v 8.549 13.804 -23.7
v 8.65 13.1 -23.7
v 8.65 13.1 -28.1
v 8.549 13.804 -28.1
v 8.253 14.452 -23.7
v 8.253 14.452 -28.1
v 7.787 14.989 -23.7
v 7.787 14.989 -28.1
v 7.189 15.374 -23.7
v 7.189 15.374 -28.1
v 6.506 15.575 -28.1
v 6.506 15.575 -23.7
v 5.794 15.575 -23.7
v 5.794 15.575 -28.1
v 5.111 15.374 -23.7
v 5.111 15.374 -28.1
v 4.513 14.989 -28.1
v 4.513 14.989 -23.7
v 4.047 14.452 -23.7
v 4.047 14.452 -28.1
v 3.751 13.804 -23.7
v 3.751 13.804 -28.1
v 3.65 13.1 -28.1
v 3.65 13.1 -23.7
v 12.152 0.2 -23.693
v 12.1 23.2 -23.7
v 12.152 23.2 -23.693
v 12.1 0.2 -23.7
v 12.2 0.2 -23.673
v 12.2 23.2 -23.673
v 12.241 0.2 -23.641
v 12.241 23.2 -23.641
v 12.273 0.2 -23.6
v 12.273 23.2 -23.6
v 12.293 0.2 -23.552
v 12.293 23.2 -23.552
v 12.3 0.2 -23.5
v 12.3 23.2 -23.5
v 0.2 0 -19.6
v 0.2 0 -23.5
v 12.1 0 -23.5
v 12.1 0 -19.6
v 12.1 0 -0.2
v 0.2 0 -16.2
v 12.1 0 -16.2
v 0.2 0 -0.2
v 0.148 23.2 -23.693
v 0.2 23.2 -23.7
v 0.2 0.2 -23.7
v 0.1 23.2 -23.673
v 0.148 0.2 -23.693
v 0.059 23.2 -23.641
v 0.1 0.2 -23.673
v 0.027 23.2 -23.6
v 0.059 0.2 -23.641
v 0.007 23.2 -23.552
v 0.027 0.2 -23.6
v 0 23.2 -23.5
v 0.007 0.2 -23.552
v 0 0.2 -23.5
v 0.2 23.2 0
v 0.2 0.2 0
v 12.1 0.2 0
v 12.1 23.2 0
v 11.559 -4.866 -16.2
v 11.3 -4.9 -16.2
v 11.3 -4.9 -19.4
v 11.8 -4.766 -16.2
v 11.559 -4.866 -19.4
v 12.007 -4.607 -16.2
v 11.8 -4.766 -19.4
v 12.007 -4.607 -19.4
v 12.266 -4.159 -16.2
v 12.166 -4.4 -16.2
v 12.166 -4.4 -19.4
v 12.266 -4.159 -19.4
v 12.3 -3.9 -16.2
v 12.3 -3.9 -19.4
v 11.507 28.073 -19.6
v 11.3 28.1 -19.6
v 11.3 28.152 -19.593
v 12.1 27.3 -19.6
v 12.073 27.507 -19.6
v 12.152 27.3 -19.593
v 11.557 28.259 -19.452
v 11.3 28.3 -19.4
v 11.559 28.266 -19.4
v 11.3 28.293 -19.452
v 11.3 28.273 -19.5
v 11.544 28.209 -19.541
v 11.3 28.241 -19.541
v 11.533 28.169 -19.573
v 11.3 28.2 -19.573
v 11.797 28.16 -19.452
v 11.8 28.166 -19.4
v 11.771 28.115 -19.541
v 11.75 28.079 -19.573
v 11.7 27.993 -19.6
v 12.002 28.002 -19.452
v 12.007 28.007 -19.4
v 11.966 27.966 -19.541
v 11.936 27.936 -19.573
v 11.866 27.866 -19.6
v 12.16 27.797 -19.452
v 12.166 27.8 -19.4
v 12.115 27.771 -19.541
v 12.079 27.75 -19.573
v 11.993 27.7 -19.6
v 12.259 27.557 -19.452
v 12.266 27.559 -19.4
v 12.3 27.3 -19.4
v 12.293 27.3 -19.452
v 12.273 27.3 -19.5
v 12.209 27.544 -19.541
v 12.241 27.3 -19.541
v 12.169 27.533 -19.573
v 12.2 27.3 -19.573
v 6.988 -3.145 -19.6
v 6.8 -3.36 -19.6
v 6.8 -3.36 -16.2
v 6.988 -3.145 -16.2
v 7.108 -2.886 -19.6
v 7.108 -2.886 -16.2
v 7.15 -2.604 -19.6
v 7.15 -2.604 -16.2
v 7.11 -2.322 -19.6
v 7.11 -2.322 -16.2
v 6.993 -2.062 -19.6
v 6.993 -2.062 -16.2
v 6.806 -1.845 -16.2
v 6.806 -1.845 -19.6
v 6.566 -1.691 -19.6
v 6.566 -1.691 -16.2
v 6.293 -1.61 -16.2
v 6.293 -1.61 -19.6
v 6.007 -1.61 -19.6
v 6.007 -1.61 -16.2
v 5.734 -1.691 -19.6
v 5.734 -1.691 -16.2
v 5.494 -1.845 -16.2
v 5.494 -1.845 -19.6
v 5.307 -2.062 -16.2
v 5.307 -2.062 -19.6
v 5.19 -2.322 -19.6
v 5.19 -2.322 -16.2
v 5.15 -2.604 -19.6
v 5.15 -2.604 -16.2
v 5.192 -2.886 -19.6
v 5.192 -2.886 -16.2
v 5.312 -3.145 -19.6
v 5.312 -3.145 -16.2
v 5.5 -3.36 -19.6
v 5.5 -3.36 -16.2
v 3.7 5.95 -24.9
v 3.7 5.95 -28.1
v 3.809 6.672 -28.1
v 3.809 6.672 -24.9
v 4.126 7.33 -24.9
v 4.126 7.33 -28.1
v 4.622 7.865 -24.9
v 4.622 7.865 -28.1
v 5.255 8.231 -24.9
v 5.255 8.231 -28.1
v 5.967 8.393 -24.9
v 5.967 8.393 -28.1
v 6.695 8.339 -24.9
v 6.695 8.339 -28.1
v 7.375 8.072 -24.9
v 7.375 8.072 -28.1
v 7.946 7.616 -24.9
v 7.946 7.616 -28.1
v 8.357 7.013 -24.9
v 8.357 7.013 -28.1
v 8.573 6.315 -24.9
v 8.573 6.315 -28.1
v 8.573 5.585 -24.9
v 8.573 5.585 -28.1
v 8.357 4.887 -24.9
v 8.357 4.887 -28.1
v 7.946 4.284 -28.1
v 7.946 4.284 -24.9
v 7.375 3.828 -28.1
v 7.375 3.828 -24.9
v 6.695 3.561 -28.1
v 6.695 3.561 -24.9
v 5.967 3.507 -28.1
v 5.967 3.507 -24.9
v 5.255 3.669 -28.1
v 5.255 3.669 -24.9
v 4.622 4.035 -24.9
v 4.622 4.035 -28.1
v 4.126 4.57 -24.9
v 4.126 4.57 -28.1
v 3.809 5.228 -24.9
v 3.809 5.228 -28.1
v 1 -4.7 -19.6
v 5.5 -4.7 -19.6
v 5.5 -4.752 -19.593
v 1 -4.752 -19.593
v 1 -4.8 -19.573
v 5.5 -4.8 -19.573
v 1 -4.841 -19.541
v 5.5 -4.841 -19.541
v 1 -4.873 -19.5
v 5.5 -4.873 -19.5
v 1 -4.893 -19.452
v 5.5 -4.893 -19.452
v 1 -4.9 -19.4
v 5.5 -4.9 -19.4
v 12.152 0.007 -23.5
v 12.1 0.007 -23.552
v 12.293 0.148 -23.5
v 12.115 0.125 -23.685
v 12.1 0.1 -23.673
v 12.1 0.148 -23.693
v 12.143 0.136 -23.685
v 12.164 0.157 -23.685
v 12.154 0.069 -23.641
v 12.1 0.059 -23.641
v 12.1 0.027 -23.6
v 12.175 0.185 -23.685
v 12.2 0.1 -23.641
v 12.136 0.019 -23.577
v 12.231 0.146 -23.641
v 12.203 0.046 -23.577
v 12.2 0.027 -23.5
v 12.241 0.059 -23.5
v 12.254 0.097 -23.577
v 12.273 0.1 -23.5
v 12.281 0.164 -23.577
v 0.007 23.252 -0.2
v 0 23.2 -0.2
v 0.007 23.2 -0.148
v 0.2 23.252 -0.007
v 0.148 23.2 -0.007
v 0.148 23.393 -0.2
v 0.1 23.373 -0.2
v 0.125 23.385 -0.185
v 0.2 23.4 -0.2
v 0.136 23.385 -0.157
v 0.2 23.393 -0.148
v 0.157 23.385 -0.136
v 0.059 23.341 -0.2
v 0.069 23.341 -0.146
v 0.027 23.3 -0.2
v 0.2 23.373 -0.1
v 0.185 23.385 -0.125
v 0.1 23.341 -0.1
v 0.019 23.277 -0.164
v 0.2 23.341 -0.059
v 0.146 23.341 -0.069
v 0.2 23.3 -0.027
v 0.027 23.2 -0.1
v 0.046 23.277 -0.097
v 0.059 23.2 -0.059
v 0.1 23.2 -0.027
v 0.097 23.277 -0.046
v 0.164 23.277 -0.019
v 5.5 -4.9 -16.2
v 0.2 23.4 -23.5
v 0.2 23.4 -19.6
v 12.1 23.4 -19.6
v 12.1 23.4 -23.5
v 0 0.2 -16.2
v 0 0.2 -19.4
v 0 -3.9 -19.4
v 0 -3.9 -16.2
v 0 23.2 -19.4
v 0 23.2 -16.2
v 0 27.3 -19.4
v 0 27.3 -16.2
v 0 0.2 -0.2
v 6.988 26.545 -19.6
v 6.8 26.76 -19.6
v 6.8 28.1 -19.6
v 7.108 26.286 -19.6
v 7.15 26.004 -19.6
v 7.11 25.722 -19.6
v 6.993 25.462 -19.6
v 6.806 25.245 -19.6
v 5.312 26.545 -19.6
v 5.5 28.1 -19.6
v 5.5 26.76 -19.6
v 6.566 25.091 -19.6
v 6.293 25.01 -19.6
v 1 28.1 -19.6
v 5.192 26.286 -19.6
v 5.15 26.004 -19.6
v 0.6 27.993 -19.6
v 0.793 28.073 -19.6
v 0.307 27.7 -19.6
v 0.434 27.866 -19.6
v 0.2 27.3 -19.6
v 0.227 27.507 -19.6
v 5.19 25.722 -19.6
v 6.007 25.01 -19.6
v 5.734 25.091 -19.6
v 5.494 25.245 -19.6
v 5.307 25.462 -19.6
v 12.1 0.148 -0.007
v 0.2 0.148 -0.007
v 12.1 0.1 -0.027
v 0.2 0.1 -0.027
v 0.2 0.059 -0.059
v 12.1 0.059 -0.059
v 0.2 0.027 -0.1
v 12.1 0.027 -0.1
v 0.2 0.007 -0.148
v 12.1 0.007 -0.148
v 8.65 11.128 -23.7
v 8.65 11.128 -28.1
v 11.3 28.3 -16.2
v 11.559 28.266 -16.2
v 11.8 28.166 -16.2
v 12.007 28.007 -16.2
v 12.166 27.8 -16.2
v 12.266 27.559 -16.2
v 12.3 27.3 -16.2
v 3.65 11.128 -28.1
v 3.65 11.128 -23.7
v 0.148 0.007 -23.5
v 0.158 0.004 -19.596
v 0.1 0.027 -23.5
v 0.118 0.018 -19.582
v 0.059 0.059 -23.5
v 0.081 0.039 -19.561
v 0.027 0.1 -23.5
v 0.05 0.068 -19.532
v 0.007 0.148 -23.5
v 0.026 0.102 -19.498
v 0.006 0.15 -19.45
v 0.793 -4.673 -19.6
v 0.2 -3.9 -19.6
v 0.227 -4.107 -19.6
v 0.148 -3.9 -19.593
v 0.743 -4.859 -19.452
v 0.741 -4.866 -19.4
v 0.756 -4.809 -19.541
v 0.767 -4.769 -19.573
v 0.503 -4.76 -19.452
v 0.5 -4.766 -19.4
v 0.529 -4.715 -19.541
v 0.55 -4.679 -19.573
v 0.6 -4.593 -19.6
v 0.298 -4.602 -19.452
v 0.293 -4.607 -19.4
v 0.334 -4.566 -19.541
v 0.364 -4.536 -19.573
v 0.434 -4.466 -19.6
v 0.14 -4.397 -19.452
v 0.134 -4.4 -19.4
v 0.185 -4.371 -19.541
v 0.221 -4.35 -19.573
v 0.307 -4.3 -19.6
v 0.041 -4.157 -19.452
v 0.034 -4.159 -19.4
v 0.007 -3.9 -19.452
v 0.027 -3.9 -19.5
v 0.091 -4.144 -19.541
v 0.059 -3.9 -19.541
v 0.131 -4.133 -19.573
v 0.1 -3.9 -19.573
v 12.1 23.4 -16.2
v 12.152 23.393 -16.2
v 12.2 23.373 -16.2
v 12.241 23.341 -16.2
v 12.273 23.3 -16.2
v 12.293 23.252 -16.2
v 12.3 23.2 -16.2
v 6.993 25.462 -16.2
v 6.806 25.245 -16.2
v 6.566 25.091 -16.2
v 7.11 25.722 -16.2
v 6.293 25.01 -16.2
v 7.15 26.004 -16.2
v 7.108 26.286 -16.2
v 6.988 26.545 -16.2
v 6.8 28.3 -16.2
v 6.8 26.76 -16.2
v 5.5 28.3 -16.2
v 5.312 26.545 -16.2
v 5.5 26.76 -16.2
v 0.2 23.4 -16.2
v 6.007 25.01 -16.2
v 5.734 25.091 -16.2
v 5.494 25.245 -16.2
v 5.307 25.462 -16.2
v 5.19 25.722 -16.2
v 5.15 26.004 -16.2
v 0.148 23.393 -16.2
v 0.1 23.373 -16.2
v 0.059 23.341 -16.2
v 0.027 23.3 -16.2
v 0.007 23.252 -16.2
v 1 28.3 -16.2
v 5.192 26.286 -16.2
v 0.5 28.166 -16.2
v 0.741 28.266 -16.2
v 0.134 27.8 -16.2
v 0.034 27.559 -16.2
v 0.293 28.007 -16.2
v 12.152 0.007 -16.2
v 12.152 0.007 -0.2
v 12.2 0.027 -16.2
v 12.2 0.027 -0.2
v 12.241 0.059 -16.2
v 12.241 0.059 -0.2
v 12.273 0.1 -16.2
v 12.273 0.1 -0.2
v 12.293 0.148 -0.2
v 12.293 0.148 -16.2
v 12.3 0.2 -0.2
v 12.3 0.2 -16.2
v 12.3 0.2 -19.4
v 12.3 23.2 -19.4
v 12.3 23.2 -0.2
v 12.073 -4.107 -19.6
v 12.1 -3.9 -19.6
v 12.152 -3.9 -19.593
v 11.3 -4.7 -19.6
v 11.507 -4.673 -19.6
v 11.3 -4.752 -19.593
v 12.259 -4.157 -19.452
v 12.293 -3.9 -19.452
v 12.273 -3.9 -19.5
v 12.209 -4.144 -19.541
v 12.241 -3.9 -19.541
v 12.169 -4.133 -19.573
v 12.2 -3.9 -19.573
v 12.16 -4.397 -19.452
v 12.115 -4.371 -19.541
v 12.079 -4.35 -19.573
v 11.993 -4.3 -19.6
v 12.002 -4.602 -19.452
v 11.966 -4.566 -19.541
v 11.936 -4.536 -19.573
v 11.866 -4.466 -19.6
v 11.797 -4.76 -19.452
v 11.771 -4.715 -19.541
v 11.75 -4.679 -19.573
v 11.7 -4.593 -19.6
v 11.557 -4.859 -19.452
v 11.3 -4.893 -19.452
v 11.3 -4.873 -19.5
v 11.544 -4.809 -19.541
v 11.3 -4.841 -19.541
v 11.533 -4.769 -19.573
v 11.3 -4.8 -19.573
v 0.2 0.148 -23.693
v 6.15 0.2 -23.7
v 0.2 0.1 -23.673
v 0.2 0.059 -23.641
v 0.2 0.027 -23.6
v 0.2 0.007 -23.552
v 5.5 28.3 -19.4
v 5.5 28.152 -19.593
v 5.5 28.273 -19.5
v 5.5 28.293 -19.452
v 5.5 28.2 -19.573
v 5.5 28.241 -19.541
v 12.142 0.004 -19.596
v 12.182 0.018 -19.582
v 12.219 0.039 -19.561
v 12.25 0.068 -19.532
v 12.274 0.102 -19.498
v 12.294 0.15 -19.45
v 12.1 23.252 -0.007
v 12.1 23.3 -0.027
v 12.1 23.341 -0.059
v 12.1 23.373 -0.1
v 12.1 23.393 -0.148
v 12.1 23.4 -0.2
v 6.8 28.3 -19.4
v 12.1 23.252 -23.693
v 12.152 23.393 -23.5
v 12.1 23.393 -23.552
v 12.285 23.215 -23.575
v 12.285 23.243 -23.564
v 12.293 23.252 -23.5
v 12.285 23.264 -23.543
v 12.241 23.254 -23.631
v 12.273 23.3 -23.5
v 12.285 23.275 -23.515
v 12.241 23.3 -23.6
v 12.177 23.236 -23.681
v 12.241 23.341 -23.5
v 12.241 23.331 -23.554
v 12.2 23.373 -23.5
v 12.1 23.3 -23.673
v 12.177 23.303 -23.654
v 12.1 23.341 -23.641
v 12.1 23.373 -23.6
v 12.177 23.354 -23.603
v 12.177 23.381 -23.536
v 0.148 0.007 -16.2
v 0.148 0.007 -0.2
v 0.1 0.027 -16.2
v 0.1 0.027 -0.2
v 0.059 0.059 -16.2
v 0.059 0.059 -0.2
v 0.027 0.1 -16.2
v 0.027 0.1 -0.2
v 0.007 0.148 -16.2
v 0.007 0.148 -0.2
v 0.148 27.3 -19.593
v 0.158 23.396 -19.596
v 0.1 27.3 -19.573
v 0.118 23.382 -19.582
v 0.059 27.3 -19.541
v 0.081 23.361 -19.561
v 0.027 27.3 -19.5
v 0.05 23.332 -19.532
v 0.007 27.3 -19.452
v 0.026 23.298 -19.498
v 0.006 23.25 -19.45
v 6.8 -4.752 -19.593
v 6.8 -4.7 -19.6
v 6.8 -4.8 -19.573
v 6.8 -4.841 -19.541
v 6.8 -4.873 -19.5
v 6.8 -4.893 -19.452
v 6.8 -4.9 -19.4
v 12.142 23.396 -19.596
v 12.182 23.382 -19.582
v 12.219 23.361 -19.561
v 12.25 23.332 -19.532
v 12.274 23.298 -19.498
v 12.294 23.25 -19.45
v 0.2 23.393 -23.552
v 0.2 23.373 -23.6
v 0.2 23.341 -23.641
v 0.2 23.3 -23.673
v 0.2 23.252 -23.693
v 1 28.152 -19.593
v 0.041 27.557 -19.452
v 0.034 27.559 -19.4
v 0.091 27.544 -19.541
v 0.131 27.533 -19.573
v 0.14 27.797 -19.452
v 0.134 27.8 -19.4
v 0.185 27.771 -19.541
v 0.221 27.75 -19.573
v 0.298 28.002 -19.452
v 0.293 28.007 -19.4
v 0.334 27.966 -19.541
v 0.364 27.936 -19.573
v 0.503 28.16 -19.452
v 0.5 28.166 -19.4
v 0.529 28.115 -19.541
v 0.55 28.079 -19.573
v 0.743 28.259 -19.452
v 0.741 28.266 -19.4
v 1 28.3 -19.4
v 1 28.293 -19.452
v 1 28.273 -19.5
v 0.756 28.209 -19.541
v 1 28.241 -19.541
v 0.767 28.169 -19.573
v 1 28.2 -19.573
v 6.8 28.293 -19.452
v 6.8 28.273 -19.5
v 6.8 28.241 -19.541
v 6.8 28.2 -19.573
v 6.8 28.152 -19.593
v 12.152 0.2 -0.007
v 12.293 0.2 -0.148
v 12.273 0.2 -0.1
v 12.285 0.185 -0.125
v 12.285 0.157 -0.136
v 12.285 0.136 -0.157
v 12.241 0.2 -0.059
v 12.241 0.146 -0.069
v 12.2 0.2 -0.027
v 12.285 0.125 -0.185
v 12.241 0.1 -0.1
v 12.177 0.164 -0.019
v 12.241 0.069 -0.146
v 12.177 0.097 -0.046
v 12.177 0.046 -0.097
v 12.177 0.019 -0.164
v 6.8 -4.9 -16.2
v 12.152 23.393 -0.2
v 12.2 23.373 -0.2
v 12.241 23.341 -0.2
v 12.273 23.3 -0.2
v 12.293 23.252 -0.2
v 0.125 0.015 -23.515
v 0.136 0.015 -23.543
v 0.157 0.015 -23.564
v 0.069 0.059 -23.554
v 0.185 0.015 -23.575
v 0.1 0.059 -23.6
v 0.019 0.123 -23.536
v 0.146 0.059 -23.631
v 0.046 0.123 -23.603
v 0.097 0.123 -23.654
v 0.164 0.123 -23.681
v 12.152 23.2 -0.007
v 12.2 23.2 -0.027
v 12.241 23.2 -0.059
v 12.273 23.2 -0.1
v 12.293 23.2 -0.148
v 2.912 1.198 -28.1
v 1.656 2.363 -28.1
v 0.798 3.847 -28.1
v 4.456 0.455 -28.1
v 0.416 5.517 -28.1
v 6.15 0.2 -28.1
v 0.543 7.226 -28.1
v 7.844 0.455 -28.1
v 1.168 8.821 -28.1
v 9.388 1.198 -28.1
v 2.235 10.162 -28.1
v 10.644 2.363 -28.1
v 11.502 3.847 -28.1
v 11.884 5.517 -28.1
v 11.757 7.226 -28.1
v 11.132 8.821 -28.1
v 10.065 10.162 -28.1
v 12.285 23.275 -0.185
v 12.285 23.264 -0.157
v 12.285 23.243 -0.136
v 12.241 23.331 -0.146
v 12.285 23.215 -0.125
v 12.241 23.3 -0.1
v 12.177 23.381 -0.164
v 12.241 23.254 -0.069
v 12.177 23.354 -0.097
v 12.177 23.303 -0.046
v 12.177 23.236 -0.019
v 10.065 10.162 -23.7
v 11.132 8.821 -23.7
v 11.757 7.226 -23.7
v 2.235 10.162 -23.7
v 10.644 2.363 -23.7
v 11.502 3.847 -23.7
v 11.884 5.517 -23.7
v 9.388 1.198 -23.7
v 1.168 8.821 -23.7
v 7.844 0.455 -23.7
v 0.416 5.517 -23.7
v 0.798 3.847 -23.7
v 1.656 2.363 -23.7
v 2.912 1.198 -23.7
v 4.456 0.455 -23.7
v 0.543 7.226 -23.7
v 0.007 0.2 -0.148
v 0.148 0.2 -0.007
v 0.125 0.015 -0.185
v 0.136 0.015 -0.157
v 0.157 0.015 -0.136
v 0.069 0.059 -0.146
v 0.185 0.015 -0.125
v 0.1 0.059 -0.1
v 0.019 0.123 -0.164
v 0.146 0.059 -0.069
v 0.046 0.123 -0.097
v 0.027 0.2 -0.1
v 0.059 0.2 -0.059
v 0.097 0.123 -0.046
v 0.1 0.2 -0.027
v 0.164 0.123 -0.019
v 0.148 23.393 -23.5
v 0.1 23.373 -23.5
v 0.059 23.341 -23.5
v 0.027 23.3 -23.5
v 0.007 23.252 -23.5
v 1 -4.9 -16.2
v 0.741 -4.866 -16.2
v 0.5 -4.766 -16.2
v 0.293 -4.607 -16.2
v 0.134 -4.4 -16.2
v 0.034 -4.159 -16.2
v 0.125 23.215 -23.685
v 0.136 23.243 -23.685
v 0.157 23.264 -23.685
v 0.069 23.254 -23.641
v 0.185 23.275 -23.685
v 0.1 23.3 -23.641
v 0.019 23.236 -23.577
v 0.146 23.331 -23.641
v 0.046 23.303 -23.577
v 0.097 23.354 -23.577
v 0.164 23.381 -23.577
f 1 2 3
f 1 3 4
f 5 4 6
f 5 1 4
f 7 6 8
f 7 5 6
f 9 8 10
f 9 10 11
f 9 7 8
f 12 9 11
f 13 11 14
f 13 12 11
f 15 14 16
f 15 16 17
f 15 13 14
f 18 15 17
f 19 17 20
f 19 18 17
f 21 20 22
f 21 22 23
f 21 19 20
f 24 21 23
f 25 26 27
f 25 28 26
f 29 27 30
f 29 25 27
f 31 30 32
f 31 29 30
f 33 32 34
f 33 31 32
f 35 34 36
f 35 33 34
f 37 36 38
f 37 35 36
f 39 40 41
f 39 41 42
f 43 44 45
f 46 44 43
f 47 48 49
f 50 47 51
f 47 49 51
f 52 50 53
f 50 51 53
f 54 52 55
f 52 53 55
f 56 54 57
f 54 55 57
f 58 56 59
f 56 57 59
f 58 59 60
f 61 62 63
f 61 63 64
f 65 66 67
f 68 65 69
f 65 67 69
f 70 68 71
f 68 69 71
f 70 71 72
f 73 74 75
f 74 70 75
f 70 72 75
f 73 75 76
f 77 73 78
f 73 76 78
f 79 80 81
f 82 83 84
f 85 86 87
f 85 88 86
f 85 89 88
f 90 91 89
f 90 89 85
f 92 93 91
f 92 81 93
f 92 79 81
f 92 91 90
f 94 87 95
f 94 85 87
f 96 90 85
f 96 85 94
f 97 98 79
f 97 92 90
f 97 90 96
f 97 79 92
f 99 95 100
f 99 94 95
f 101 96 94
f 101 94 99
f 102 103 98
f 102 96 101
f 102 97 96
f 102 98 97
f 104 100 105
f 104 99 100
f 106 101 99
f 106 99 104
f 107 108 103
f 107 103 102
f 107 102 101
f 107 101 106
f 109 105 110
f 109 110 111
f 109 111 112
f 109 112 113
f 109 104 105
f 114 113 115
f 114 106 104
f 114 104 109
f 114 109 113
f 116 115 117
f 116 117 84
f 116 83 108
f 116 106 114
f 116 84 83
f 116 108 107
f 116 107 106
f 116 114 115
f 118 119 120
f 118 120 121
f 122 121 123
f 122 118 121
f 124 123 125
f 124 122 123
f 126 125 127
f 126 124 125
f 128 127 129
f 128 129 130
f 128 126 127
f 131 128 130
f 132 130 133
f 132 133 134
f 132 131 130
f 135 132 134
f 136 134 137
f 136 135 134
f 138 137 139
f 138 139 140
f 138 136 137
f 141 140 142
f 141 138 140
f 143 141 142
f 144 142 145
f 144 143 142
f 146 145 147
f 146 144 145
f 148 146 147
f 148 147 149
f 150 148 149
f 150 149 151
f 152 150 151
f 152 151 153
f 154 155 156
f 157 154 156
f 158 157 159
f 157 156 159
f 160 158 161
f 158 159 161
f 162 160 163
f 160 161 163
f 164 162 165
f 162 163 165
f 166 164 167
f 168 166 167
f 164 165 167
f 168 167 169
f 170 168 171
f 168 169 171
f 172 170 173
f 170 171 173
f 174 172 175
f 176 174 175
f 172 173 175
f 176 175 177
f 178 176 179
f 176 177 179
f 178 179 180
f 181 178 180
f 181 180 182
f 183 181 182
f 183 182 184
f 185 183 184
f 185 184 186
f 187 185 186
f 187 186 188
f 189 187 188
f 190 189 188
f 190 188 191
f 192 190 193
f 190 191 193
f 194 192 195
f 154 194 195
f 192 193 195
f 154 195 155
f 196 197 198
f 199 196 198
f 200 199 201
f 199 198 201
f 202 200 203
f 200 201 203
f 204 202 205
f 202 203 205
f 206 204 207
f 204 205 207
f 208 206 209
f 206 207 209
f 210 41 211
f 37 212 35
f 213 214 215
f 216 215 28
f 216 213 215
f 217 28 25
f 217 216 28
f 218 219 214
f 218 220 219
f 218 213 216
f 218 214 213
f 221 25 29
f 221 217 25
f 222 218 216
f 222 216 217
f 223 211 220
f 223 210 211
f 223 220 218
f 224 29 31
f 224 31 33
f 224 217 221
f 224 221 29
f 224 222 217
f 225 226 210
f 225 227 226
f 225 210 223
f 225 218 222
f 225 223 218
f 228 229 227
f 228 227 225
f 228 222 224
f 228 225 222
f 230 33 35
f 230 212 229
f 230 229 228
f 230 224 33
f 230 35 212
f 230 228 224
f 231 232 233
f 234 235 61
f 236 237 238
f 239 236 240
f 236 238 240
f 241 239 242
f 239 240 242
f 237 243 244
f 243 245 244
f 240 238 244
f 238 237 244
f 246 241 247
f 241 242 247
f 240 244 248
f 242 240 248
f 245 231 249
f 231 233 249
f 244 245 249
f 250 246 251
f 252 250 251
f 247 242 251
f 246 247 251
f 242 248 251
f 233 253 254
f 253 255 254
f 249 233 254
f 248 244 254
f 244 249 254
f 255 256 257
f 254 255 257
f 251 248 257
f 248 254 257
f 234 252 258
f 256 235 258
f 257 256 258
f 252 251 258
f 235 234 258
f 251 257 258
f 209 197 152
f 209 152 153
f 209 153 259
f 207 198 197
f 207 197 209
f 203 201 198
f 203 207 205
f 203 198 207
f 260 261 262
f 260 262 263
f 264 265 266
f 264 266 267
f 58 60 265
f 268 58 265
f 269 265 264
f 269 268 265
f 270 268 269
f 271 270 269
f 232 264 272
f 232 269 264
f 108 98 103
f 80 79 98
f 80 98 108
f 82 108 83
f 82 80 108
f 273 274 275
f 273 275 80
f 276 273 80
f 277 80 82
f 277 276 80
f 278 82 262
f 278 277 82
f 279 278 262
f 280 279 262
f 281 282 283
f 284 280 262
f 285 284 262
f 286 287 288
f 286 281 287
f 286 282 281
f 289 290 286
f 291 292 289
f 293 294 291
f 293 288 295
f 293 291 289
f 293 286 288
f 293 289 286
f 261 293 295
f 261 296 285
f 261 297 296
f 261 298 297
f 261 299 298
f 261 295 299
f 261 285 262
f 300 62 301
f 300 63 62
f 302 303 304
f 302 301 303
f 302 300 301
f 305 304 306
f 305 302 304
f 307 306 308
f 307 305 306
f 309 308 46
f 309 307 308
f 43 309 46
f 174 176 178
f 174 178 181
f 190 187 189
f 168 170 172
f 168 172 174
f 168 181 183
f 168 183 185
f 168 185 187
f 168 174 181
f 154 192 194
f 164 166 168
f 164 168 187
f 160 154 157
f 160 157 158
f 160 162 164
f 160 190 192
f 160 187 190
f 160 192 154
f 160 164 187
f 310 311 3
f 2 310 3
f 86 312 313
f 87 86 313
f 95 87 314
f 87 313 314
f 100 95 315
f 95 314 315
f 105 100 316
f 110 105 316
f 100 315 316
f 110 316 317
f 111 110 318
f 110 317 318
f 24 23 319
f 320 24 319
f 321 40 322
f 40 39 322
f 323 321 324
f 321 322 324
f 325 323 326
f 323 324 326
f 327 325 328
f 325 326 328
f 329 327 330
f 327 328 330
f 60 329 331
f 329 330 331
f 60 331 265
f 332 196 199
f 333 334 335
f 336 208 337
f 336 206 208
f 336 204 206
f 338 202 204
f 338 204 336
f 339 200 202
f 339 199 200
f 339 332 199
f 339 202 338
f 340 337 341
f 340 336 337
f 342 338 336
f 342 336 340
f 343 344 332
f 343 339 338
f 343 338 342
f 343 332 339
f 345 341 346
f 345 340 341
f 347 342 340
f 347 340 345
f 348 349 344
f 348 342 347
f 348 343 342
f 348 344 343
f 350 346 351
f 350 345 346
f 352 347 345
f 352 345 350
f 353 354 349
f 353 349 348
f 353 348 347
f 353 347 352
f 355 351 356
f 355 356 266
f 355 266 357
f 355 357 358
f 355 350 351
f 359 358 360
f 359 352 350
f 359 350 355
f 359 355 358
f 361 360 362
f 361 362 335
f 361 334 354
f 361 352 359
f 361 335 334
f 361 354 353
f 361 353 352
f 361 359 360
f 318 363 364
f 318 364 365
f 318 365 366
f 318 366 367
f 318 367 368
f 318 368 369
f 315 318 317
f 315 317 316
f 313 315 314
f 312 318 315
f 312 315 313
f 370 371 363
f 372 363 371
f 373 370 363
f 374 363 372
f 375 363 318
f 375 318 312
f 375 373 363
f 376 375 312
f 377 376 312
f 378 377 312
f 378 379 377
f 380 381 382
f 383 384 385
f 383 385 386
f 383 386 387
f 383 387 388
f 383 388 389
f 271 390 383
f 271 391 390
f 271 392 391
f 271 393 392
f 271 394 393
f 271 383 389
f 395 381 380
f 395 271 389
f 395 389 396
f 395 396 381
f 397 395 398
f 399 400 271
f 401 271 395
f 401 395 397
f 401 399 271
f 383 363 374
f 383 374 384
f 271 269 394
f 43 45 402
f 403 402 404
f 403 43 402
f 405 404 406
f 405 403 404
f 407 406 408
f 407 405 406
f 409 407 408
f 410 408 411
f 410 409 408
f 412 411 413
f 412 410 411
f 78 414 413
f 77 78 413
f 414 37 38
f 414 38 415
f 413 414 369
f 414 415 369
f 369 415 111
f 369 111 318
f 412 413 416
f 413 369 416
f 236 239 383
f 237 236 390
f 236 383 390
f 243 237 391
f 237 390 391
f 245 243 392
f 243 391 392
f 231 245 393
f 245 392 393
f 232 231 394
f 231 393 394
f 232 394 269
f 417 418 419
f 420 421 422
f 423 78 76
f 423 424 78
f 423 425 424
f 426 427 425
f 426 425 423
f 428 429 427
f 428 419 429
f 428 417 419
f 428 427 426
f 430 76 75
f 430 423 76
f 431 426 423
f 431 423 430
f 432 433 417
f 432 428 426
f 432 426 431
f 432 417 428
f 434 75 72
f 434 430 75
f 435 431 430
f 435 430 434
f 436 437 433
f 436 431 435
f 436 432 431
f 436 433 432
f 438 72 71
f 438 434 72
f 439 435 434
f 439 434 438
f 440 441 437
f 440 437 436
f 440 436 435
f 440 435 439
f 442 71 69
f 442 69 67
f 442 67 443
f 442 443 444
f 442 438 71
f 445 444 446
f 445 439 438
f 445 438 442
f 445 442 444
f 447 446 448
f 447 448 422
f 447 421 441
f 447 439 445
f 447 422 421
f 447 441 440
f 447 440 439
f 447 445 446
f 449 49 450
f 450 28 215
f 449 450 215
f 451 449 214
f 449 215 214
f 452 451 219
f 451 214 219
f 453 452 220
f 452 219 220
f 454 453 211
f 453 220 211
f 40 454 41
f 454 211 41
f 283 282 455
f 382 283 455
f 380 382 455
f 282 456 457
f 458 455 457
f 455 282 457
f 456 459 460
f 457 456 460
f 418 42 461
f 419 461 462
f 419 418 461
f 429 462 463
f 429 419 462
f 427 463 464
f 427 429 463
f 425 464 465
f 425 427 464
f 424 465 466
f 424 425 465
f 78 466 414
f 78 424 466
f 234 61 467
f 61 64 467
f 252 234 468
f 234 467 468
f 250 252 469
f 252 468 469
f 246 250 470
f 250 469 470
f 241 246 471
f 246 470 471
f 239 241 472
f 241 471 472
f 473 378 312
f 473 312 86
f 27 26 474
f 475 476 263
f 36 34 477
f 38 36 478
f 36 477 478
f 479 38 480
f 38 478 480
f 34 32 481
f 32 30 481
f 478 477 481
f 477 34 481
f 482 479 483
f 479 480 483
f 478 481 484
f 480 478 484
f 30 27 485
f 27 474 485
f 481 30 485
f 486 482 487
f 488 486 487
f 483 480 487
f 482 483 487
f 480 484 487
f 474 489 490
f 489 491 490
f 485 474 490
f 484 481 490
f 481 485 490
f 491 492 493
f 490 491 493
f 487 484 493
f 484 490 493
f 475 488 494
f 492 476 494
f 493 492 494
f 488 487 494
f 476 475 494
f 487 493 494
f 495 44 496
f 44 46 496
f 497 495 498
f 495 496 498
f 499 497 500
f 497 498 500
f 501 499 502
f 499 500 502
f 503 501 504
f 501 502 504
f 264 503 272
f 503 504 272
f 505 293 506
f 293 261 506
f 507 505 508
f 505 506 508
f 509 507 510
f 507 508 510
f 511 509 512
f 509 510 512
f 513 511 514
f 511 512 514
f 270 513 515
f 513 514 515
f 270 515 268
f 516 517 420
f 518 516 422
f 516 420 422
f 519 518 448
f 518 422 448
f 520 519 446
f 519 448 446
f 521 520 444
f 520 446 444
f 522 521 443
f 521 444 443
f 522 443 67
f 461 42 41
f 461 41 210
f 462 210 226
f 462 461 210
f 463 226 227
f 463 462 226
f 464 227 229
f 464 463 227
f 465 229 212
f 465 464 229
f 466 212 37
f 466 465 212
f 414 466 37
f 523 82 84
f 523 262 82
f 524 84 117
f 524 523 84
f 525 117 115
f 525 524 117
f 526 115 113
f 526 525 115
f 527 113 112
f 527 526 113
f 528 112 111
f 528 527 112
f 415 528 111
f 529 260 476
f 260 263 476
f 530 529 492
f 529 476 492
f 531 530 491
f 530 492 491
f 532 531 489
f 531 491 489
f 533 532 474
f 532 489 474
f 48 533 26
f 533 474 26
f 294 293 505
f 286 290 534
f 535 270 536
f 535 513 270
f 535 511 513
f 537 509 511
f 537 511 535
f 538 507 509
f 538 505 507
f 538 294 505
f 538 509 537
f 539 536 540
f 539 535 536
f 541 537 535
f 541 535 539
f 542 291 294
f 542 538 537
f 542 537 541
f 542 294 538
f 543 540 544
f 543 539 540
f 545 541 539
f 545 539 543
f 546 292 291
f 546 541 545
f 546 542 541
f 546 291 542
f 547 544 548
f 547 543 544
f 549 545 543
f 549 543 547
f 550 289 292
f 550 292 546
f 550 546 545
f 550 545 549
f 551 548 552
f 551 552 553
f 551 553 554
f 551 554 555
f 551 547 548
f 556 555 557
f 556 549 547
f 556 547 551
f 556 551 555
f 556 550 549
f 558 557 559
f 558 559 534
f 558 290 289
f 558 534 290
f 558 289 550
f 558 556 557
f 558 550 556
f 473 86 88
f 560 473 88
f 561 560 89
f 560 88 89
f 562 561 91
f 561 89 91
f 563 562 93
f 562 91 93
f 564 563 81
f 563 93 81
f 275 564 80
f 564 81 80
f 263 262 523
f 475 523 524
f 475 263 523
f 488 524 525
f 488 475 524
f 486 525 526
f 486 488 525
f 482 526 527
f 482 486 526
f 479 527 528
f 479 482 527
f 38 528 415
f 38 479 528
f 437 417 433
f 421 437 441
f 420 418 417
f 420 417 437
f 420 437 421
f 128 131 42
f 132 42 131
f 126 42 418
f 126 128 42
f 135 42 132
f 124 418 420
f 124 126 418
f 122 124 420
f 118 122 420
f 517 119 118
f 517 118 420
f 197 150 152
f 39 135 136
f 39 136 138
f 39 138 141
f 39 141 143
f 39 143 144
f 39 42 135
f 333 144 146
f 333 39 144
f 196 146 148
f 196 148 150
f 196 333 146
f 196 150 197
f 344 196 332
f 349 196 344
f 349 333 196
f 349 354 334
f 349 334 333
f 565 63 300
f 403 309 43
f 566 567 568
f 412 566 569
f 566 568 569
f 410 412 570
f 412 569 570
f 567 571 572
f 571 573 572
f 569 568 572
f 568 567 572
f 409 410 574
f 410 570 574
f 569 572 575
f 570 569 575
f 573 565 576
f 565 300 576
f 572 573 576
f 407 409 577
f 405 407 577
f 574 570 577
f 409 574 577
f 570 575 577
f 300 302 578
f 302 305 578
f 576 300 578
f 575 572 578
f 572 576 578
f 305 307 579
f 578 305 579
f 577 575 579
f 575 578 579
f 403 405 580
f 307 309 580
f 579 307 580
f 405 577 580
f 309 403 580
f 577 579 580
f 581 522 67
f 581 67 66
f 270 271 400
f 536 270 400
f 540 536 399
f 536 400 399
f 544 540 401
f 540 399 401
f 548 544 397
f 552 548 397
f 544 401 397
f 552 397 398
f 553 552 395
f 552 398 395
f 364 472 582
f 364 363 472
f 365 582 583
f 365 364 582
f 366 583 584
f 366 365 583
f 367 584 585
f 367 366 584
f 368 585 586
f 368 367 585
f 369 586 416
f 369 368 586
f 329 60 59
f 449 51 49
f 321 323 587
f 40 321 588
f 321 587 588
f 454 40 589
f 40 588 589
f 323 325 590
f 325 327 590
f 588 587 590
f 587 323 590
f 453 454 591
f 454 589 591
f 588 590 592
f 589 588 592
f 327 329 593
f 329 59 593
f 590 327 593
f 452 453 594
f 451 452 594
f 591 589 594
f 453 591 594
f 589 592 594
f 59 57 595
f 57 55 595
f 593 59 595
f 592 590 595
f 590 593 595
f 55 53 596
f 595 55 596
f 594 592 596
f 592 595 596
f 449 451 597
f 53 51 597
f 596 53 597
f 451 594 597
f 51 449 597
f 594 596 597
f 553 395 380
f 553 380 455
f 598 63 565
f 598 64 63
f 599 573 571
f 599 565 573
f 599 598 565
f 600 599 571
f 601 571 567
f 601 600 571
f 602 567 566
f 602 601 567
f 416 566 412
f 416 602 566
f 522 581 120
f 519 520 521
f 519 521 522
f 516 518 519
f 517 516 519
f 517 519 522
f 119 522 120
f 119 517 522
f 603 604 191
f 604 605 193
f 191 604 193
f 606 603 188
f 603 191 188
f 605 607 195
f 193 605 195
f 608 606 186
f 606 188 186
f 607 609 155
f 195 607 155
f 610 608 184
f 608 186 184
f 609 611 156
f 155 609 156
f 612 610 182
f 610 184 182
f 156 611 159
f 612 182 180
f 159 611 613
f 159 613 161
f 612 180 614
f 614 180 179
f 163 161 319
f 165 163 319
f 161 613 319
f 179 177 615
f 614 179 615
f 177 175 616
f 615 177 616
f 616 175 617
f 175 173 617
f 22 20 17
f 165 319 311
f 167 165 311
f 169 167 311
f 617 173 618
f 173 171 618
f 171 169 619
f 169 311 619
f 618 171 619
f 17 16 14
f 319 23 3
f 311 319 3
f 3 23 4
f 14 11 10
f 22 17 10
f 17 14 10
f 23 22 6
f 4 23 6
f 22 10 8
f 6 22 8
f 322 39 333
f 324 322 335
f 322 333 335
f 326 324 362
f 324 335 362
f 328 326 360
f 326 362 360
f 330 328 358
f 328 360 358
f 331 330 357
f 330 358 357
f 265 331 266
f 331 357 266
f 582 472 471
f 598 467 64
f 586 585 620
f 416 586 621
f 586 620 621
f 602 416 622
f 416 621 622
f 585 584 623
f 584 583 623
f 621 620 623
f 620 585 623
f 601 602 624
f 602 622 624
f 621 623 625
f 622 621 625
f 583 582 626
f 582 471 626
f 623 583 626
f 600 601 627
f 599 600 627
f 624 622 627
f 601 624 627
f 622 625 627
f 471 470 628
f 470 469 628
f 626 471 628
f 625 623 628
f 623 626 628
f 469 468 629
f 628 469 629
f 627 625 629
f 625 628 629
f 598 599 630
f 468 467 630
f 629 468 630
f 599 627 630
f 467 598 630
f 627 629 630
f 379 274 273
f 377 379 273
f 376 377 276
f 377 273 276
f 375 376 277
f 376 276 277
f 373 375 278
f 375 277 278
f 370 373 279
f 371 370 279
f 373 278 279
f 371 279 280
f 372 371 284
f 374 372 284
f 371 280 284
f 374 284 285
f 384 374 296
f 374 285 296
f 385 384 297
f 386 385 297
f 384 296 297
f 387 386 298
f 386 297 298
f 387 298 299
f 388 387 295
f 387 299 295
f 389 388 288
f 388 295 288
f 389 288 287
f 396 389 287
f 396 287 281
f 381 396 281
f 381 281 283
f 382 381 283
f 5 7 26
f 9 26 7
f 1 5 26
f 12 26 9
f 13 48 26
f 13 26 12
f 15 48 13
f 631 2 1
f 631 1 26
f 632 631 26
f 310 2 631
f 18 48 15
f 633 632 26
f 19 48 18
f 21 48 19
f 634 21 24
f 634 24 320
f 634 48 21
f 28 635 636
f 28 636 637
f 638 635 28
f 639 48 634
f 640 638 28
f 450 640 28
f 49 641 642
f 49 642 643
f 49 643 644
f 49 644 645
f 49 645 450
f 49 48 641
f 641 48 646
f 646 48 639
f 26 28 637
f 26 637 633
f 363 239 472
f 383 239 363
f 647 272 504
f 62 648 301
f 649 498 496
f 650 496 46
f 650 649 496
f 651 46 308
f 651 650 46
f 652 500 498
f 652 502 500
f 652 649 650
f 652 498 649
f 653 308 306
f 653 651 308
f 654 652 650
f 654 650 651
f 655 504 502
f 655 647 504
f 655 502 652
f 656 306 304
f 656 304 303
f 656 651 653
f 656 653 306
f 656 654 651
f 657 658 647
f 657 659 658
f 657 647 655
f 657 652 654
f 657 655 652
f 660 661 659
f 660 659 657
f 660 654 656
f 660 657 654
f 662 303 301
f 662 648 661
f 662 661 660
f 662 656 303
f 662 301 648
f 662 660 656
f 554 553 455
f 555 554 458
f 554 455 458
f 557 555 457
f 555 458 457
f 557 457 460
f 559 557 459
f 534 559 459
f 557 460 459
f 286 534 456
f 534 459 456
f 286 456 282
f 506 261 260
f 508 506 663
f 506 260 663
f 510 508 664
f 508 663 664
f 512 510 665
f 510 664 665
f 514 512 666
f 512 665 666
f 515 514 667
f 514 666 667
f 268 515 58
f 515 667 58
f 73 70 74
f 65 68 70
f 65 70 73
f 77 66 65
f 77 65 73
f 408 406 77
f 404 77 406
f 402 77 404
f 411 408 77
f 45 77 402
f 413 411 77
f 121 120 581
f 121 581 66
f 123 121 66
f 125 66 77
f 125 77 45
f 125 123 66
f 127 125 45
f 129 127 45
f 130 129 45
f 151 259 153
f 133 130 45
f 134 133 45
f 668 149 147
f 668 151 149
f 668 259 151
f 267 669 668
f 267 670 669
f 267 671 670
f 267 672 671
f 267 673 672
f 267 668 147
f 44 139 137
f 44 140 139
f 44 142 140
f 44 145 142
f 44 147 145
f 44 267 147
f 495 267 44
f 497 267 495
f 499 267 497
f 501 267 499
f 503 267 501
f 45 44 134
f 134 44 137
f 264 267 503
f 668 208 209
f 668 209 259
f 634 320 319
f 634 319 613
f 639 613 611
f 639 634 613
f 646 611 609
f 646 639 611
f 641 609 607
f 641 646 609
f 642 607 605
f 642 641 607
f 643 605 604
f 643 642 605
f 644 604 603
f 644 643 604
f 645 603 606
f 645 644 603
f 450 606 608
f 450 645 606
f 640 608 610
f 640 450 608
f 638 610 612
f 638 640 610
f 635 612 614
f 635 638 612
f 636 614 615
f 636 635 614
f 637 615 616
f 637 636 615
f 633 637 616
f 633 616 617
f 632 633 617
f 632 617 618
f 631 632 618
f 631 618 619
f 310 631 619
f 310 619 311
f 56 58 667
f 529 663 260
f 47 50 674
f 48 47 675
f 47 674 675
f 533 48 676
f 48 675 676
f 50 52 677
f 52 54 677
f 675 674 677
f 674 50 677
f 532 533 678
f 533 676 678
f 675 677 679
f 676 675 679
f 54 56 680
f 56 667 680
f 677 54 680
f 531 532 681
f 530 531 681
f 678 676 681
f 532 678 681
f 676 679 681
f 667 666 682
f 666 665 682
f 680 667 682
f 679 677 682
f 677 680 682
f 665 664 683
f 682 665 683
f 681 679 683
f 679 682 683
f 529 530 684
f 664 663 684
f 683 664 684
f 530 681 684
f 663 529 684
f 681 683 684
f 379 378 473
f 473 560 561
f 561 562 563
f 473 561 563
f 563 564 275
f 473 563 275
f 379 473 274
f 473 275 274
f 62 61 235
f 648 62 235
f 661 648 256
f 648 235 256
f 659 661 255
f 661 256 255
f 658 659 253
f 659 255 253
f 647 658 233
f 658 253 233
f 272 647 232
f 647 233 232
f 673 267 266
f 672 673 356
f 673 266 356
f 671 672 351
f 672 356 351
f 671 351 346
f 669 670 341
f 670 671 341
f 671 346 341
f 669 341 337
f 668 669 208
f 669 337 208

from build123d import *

# Parameters (mm, degrees)
DODANIE_WYCI_GNI_CIE1_DEPTH = 12.3
ZAOKR_GLENIE1_R             = 0.2
ZAOKR_GLENIE2_R             = 1
DODANIE_WYCI_GNI_CIE2_DEPTH = 4.4
SZKIC3_R                    = 2.45
WYTNIJ_WYCI_GNI_CIE1_DEPTH  = 3.2
WYTNIJ_WYCI_GNI_CIE2_REACH  = 38.556


with BuildPart() as part:
    # Szkic1 → Dodanie-wyciągnięcie1 (new body)
    with BuildSketch(Plane(origin=(0, 0, 0), x_dir=(0, 0, -1), z_dir=(1, 0, 0))):
        Polygon((0, 0), (0, 23.4), (16.2, 23.4), (16.2, 28.3), (19.6, 28.3), (19.6, 23.4), (23.7, 23.4), (23.7, 0), (19.6, 0), (19.6, -4.9), (16.2, -4.9), (16.2, 0), align=None)
    extrude(amount=DODANIE_WYCI_GNI_CIE1_DEPTH)

    # Zaokrąglenie1
    zaokr_glenie1_edges = [part.edges().sort_by_distance(p)[0] for p in [
        (0, 11.7, 0),
        (0, 23.4, -8.1),
        (0, 25.85, -19.6),
        (0, 23.4, -21.65),
        (0, 11.7, -23.7),
        (0, 0, -21.65),
        (0, -2.45, -19.6),
        (0, 0, -8.1),
        (12.3, -2.45, -19.6),
        (6.15, 0, 0),
        (6.15, 23.4, 0),
        (12.3, 0, -21.65),
        (6.15, 28.3, -19.6),
        (6.15, 23.4, -23.7),
        (6.15, 0, -23.7),
        (6.15, -4.9, -19.6),
        (12.3, 11.7, -23.7),
        (12.3, 23.4, -21.65),
        (12.3, 25.85, -19.6),
        (12.3, 23.4, -8.1),
        (12.3, 11.7, 0),
        (12.3, 0, -8.1),
    ]]
    fillet(zaokr_glenie1_edges, radius=ZAOKR_GLENIE1_R)

    # Zaokrąglenie2
    # the kernel refuses this fillet: 1 mm, written as the material it takes off along each edge
    with BuildSketch(Plane(origin=(11.3, 27.3, -19.6), x_dir=(0, 1, 0), z_dir=(-1, 0, 0))) as zaokr_glenie2_piece_1:
        with BuildLine():
            CenterArc((0.8, -0.2), 0.2, 0, 90)
            Line((1, -0.2), (1, 0))
            Line((1, 0), (0.8, 0))
        make_face()
    revolve(axis=Axis((11.3, 27.3, -19.6), (0, 0, -1)), revolution_arc=90, mode=Mode.SUBTRACT)
    with BuildSketch(Plane(origin=(1, 27.3, -19.6), x_dir=(-1, 0, 0), z_dir=(0, -1, 0))) as zaokr_glenie2_piece_2:
        with BuildLine():
            CenterArc((0.8, -0.2), 0.2, 0, 90)
            Line((1, -0.2), (1, 0))
            Line((1, 0), (0.8, 0))
        make_face()
    revolve(axis=Axis((1, 27.3, -19.6), (0, 0, -1)), revolution_arc=90, mode=Mode.SUBTRACT)
    with BuildSketch(Plane(origin=(11.3, -3.9, -19.6), x_dir=(1, 0, 0), z_dir=(0, 1, 0))) as zaokr_glenie2_piece_3:
        with BuildLine():
            CenterArc((0.8, -0.2), 0.2, 0, 90)
            Line((1, -0.2), (1, 0))
            Line((1, 0), (0.8, 0))
        make_face()
    revolve(axis=Axis((11.3, -3.9, -19.6), (0, 0, -1)), revolution_arc=90, mode=Mode.SUBTRACT)
    with BuildSketch(Plane(origin=(1, -3.9, -19.6), x_dir=(0, -1, 0), z_dir=(1, 0, 0))) as zaokr_glenie2_piece_4:
        with BuildLine():
            CenterArc((0.8, -0.2), 0.2, 0, 90)
            Line((1, -0.2), (1, 0))
            Line((1, 0), (0.8, 0))
        make_face()
    revolve(axis=Axis((1, -3.9, -19.6), (0, 0, -1)), revolution_arc=90, mode=Mode.SUBTRACT)
    with BuildSketch(Plane(origin=(12.3, -4.9, -19.6), x_dir=(-1, 0, 0), z_dir=(0, 0, 1)), Plane(origin=(0, -4.9, -19.6), x_dir=(0, 1, 0), z_dir=(0, 0, 1)), Plane(origin=(0, 28.3, -13.7), x_dir=(0, -1, 0), z_dir=(0, 0, -1)), Plane(origin=(12.3, 28.3, -13.7), x_dir=(-1, 0, 0), z_dir=(0, 0, -1))) as zaokr_glenie2_piece_5:
        with BuildLine():
            CenterArc((ZAOKR_GLENIE2_R, -ZAOKR_GLENIE2_R), ZAOKR_GLENIE2_R, 90, 90)
            Line((0, -ZAOKR_GLENIE2_R), (0, 0))
            Line((0, 0), (ZAOKR_GLENIE2_R, 0))
        make_face()
    extrude(amount=5.9, mode=Mode.SUBTRACT)

    # Szkic2 → Dodanie-wyciągnięcie2 (add)
    with BuildSketch(Plane(origin=(0, 0, -23.7), x_dir=(-1, 0, 0), z_dir=(0, 0, -1))):
        with BuildLine():
            Line((-3.65, 13.1), (-3.65, 11.128078794))
            ThreePointArc((-3.65, 11.128078794), (-6.15, 0.2), (-8.65, 11.128078794))
            Line((-8.65, 11.128078794), (-8.65, 13.1))
            ThreePointArc((-8.65, 13.1), (-6.15, 15.6), (-3.65, 13.1))
        make_face()
    extrude(amount=DODANIE_WYCI_GNI_CIE2_DEPTH)

    # Szkic3 → Wytnij-wyciągnięcie1 (cut)
    with BuildSketch(Plane(origin=(0, 0, -28.1), x_dir=(-1, 0, 0), z_dir=(0, 0, -1))):
        with Locations((-6.15, 5.95)):
            Circle(SZKIC3_R)
    extrude(amount=-WYTNIJ_WYCI_GNI_CIE1_DEPTH, mode=Mode.SUBTRACT)

    # Szkic5 → Wytnij-wyciągnięcie2 (cut, up to next)
    with BuildSketch(Plane(origin=(0, 0, -19.6), x_dir=(-1, 0, 0), z_dir=(0, 0, -1)), mode=Mode.PRIVATE) as wytnij_wyci_gni_cie2_sk1:
        with BuildLine():
            Line((-5.5, 26.759934208), (-5.5, 28.3))
            Line((-5.5, 28.3), (-6.8, 28.3))
            Line((-6.8, 28.3), (-6.8, 26.759934208))
            ThreePointArc((-6.8, 26.759934208), (-6.15, 25), (-5.5, 26.759934208))
        make_face()
    wytnij_wyci_gni_cie2_tool1 = extrude(wytnij_wyci_gni_cie2_sk1.sketch, amount=-WYTNIJ_WYCI_GNI_CIE2_REACH, mode=Mode.PRIVATE) & part.part
    wytnij_wyci_gni_cie2 = wytnij_wyci_gni_cie2_tool1.solids().sort_by_distance((6.15, 26.584181, -19.6))[0]
    add(wytnij_wyci_gni_cie2, mode=Mode.SUBTRACT)

    # Lustro1: Wytnij-wyciągnięcie2 across plane
    add(wytnij_wyci_gni_cie2.mirror(Plane.ZX.offset(11.7)), mode=Mode.SUBTRACT)


solid = part.part
